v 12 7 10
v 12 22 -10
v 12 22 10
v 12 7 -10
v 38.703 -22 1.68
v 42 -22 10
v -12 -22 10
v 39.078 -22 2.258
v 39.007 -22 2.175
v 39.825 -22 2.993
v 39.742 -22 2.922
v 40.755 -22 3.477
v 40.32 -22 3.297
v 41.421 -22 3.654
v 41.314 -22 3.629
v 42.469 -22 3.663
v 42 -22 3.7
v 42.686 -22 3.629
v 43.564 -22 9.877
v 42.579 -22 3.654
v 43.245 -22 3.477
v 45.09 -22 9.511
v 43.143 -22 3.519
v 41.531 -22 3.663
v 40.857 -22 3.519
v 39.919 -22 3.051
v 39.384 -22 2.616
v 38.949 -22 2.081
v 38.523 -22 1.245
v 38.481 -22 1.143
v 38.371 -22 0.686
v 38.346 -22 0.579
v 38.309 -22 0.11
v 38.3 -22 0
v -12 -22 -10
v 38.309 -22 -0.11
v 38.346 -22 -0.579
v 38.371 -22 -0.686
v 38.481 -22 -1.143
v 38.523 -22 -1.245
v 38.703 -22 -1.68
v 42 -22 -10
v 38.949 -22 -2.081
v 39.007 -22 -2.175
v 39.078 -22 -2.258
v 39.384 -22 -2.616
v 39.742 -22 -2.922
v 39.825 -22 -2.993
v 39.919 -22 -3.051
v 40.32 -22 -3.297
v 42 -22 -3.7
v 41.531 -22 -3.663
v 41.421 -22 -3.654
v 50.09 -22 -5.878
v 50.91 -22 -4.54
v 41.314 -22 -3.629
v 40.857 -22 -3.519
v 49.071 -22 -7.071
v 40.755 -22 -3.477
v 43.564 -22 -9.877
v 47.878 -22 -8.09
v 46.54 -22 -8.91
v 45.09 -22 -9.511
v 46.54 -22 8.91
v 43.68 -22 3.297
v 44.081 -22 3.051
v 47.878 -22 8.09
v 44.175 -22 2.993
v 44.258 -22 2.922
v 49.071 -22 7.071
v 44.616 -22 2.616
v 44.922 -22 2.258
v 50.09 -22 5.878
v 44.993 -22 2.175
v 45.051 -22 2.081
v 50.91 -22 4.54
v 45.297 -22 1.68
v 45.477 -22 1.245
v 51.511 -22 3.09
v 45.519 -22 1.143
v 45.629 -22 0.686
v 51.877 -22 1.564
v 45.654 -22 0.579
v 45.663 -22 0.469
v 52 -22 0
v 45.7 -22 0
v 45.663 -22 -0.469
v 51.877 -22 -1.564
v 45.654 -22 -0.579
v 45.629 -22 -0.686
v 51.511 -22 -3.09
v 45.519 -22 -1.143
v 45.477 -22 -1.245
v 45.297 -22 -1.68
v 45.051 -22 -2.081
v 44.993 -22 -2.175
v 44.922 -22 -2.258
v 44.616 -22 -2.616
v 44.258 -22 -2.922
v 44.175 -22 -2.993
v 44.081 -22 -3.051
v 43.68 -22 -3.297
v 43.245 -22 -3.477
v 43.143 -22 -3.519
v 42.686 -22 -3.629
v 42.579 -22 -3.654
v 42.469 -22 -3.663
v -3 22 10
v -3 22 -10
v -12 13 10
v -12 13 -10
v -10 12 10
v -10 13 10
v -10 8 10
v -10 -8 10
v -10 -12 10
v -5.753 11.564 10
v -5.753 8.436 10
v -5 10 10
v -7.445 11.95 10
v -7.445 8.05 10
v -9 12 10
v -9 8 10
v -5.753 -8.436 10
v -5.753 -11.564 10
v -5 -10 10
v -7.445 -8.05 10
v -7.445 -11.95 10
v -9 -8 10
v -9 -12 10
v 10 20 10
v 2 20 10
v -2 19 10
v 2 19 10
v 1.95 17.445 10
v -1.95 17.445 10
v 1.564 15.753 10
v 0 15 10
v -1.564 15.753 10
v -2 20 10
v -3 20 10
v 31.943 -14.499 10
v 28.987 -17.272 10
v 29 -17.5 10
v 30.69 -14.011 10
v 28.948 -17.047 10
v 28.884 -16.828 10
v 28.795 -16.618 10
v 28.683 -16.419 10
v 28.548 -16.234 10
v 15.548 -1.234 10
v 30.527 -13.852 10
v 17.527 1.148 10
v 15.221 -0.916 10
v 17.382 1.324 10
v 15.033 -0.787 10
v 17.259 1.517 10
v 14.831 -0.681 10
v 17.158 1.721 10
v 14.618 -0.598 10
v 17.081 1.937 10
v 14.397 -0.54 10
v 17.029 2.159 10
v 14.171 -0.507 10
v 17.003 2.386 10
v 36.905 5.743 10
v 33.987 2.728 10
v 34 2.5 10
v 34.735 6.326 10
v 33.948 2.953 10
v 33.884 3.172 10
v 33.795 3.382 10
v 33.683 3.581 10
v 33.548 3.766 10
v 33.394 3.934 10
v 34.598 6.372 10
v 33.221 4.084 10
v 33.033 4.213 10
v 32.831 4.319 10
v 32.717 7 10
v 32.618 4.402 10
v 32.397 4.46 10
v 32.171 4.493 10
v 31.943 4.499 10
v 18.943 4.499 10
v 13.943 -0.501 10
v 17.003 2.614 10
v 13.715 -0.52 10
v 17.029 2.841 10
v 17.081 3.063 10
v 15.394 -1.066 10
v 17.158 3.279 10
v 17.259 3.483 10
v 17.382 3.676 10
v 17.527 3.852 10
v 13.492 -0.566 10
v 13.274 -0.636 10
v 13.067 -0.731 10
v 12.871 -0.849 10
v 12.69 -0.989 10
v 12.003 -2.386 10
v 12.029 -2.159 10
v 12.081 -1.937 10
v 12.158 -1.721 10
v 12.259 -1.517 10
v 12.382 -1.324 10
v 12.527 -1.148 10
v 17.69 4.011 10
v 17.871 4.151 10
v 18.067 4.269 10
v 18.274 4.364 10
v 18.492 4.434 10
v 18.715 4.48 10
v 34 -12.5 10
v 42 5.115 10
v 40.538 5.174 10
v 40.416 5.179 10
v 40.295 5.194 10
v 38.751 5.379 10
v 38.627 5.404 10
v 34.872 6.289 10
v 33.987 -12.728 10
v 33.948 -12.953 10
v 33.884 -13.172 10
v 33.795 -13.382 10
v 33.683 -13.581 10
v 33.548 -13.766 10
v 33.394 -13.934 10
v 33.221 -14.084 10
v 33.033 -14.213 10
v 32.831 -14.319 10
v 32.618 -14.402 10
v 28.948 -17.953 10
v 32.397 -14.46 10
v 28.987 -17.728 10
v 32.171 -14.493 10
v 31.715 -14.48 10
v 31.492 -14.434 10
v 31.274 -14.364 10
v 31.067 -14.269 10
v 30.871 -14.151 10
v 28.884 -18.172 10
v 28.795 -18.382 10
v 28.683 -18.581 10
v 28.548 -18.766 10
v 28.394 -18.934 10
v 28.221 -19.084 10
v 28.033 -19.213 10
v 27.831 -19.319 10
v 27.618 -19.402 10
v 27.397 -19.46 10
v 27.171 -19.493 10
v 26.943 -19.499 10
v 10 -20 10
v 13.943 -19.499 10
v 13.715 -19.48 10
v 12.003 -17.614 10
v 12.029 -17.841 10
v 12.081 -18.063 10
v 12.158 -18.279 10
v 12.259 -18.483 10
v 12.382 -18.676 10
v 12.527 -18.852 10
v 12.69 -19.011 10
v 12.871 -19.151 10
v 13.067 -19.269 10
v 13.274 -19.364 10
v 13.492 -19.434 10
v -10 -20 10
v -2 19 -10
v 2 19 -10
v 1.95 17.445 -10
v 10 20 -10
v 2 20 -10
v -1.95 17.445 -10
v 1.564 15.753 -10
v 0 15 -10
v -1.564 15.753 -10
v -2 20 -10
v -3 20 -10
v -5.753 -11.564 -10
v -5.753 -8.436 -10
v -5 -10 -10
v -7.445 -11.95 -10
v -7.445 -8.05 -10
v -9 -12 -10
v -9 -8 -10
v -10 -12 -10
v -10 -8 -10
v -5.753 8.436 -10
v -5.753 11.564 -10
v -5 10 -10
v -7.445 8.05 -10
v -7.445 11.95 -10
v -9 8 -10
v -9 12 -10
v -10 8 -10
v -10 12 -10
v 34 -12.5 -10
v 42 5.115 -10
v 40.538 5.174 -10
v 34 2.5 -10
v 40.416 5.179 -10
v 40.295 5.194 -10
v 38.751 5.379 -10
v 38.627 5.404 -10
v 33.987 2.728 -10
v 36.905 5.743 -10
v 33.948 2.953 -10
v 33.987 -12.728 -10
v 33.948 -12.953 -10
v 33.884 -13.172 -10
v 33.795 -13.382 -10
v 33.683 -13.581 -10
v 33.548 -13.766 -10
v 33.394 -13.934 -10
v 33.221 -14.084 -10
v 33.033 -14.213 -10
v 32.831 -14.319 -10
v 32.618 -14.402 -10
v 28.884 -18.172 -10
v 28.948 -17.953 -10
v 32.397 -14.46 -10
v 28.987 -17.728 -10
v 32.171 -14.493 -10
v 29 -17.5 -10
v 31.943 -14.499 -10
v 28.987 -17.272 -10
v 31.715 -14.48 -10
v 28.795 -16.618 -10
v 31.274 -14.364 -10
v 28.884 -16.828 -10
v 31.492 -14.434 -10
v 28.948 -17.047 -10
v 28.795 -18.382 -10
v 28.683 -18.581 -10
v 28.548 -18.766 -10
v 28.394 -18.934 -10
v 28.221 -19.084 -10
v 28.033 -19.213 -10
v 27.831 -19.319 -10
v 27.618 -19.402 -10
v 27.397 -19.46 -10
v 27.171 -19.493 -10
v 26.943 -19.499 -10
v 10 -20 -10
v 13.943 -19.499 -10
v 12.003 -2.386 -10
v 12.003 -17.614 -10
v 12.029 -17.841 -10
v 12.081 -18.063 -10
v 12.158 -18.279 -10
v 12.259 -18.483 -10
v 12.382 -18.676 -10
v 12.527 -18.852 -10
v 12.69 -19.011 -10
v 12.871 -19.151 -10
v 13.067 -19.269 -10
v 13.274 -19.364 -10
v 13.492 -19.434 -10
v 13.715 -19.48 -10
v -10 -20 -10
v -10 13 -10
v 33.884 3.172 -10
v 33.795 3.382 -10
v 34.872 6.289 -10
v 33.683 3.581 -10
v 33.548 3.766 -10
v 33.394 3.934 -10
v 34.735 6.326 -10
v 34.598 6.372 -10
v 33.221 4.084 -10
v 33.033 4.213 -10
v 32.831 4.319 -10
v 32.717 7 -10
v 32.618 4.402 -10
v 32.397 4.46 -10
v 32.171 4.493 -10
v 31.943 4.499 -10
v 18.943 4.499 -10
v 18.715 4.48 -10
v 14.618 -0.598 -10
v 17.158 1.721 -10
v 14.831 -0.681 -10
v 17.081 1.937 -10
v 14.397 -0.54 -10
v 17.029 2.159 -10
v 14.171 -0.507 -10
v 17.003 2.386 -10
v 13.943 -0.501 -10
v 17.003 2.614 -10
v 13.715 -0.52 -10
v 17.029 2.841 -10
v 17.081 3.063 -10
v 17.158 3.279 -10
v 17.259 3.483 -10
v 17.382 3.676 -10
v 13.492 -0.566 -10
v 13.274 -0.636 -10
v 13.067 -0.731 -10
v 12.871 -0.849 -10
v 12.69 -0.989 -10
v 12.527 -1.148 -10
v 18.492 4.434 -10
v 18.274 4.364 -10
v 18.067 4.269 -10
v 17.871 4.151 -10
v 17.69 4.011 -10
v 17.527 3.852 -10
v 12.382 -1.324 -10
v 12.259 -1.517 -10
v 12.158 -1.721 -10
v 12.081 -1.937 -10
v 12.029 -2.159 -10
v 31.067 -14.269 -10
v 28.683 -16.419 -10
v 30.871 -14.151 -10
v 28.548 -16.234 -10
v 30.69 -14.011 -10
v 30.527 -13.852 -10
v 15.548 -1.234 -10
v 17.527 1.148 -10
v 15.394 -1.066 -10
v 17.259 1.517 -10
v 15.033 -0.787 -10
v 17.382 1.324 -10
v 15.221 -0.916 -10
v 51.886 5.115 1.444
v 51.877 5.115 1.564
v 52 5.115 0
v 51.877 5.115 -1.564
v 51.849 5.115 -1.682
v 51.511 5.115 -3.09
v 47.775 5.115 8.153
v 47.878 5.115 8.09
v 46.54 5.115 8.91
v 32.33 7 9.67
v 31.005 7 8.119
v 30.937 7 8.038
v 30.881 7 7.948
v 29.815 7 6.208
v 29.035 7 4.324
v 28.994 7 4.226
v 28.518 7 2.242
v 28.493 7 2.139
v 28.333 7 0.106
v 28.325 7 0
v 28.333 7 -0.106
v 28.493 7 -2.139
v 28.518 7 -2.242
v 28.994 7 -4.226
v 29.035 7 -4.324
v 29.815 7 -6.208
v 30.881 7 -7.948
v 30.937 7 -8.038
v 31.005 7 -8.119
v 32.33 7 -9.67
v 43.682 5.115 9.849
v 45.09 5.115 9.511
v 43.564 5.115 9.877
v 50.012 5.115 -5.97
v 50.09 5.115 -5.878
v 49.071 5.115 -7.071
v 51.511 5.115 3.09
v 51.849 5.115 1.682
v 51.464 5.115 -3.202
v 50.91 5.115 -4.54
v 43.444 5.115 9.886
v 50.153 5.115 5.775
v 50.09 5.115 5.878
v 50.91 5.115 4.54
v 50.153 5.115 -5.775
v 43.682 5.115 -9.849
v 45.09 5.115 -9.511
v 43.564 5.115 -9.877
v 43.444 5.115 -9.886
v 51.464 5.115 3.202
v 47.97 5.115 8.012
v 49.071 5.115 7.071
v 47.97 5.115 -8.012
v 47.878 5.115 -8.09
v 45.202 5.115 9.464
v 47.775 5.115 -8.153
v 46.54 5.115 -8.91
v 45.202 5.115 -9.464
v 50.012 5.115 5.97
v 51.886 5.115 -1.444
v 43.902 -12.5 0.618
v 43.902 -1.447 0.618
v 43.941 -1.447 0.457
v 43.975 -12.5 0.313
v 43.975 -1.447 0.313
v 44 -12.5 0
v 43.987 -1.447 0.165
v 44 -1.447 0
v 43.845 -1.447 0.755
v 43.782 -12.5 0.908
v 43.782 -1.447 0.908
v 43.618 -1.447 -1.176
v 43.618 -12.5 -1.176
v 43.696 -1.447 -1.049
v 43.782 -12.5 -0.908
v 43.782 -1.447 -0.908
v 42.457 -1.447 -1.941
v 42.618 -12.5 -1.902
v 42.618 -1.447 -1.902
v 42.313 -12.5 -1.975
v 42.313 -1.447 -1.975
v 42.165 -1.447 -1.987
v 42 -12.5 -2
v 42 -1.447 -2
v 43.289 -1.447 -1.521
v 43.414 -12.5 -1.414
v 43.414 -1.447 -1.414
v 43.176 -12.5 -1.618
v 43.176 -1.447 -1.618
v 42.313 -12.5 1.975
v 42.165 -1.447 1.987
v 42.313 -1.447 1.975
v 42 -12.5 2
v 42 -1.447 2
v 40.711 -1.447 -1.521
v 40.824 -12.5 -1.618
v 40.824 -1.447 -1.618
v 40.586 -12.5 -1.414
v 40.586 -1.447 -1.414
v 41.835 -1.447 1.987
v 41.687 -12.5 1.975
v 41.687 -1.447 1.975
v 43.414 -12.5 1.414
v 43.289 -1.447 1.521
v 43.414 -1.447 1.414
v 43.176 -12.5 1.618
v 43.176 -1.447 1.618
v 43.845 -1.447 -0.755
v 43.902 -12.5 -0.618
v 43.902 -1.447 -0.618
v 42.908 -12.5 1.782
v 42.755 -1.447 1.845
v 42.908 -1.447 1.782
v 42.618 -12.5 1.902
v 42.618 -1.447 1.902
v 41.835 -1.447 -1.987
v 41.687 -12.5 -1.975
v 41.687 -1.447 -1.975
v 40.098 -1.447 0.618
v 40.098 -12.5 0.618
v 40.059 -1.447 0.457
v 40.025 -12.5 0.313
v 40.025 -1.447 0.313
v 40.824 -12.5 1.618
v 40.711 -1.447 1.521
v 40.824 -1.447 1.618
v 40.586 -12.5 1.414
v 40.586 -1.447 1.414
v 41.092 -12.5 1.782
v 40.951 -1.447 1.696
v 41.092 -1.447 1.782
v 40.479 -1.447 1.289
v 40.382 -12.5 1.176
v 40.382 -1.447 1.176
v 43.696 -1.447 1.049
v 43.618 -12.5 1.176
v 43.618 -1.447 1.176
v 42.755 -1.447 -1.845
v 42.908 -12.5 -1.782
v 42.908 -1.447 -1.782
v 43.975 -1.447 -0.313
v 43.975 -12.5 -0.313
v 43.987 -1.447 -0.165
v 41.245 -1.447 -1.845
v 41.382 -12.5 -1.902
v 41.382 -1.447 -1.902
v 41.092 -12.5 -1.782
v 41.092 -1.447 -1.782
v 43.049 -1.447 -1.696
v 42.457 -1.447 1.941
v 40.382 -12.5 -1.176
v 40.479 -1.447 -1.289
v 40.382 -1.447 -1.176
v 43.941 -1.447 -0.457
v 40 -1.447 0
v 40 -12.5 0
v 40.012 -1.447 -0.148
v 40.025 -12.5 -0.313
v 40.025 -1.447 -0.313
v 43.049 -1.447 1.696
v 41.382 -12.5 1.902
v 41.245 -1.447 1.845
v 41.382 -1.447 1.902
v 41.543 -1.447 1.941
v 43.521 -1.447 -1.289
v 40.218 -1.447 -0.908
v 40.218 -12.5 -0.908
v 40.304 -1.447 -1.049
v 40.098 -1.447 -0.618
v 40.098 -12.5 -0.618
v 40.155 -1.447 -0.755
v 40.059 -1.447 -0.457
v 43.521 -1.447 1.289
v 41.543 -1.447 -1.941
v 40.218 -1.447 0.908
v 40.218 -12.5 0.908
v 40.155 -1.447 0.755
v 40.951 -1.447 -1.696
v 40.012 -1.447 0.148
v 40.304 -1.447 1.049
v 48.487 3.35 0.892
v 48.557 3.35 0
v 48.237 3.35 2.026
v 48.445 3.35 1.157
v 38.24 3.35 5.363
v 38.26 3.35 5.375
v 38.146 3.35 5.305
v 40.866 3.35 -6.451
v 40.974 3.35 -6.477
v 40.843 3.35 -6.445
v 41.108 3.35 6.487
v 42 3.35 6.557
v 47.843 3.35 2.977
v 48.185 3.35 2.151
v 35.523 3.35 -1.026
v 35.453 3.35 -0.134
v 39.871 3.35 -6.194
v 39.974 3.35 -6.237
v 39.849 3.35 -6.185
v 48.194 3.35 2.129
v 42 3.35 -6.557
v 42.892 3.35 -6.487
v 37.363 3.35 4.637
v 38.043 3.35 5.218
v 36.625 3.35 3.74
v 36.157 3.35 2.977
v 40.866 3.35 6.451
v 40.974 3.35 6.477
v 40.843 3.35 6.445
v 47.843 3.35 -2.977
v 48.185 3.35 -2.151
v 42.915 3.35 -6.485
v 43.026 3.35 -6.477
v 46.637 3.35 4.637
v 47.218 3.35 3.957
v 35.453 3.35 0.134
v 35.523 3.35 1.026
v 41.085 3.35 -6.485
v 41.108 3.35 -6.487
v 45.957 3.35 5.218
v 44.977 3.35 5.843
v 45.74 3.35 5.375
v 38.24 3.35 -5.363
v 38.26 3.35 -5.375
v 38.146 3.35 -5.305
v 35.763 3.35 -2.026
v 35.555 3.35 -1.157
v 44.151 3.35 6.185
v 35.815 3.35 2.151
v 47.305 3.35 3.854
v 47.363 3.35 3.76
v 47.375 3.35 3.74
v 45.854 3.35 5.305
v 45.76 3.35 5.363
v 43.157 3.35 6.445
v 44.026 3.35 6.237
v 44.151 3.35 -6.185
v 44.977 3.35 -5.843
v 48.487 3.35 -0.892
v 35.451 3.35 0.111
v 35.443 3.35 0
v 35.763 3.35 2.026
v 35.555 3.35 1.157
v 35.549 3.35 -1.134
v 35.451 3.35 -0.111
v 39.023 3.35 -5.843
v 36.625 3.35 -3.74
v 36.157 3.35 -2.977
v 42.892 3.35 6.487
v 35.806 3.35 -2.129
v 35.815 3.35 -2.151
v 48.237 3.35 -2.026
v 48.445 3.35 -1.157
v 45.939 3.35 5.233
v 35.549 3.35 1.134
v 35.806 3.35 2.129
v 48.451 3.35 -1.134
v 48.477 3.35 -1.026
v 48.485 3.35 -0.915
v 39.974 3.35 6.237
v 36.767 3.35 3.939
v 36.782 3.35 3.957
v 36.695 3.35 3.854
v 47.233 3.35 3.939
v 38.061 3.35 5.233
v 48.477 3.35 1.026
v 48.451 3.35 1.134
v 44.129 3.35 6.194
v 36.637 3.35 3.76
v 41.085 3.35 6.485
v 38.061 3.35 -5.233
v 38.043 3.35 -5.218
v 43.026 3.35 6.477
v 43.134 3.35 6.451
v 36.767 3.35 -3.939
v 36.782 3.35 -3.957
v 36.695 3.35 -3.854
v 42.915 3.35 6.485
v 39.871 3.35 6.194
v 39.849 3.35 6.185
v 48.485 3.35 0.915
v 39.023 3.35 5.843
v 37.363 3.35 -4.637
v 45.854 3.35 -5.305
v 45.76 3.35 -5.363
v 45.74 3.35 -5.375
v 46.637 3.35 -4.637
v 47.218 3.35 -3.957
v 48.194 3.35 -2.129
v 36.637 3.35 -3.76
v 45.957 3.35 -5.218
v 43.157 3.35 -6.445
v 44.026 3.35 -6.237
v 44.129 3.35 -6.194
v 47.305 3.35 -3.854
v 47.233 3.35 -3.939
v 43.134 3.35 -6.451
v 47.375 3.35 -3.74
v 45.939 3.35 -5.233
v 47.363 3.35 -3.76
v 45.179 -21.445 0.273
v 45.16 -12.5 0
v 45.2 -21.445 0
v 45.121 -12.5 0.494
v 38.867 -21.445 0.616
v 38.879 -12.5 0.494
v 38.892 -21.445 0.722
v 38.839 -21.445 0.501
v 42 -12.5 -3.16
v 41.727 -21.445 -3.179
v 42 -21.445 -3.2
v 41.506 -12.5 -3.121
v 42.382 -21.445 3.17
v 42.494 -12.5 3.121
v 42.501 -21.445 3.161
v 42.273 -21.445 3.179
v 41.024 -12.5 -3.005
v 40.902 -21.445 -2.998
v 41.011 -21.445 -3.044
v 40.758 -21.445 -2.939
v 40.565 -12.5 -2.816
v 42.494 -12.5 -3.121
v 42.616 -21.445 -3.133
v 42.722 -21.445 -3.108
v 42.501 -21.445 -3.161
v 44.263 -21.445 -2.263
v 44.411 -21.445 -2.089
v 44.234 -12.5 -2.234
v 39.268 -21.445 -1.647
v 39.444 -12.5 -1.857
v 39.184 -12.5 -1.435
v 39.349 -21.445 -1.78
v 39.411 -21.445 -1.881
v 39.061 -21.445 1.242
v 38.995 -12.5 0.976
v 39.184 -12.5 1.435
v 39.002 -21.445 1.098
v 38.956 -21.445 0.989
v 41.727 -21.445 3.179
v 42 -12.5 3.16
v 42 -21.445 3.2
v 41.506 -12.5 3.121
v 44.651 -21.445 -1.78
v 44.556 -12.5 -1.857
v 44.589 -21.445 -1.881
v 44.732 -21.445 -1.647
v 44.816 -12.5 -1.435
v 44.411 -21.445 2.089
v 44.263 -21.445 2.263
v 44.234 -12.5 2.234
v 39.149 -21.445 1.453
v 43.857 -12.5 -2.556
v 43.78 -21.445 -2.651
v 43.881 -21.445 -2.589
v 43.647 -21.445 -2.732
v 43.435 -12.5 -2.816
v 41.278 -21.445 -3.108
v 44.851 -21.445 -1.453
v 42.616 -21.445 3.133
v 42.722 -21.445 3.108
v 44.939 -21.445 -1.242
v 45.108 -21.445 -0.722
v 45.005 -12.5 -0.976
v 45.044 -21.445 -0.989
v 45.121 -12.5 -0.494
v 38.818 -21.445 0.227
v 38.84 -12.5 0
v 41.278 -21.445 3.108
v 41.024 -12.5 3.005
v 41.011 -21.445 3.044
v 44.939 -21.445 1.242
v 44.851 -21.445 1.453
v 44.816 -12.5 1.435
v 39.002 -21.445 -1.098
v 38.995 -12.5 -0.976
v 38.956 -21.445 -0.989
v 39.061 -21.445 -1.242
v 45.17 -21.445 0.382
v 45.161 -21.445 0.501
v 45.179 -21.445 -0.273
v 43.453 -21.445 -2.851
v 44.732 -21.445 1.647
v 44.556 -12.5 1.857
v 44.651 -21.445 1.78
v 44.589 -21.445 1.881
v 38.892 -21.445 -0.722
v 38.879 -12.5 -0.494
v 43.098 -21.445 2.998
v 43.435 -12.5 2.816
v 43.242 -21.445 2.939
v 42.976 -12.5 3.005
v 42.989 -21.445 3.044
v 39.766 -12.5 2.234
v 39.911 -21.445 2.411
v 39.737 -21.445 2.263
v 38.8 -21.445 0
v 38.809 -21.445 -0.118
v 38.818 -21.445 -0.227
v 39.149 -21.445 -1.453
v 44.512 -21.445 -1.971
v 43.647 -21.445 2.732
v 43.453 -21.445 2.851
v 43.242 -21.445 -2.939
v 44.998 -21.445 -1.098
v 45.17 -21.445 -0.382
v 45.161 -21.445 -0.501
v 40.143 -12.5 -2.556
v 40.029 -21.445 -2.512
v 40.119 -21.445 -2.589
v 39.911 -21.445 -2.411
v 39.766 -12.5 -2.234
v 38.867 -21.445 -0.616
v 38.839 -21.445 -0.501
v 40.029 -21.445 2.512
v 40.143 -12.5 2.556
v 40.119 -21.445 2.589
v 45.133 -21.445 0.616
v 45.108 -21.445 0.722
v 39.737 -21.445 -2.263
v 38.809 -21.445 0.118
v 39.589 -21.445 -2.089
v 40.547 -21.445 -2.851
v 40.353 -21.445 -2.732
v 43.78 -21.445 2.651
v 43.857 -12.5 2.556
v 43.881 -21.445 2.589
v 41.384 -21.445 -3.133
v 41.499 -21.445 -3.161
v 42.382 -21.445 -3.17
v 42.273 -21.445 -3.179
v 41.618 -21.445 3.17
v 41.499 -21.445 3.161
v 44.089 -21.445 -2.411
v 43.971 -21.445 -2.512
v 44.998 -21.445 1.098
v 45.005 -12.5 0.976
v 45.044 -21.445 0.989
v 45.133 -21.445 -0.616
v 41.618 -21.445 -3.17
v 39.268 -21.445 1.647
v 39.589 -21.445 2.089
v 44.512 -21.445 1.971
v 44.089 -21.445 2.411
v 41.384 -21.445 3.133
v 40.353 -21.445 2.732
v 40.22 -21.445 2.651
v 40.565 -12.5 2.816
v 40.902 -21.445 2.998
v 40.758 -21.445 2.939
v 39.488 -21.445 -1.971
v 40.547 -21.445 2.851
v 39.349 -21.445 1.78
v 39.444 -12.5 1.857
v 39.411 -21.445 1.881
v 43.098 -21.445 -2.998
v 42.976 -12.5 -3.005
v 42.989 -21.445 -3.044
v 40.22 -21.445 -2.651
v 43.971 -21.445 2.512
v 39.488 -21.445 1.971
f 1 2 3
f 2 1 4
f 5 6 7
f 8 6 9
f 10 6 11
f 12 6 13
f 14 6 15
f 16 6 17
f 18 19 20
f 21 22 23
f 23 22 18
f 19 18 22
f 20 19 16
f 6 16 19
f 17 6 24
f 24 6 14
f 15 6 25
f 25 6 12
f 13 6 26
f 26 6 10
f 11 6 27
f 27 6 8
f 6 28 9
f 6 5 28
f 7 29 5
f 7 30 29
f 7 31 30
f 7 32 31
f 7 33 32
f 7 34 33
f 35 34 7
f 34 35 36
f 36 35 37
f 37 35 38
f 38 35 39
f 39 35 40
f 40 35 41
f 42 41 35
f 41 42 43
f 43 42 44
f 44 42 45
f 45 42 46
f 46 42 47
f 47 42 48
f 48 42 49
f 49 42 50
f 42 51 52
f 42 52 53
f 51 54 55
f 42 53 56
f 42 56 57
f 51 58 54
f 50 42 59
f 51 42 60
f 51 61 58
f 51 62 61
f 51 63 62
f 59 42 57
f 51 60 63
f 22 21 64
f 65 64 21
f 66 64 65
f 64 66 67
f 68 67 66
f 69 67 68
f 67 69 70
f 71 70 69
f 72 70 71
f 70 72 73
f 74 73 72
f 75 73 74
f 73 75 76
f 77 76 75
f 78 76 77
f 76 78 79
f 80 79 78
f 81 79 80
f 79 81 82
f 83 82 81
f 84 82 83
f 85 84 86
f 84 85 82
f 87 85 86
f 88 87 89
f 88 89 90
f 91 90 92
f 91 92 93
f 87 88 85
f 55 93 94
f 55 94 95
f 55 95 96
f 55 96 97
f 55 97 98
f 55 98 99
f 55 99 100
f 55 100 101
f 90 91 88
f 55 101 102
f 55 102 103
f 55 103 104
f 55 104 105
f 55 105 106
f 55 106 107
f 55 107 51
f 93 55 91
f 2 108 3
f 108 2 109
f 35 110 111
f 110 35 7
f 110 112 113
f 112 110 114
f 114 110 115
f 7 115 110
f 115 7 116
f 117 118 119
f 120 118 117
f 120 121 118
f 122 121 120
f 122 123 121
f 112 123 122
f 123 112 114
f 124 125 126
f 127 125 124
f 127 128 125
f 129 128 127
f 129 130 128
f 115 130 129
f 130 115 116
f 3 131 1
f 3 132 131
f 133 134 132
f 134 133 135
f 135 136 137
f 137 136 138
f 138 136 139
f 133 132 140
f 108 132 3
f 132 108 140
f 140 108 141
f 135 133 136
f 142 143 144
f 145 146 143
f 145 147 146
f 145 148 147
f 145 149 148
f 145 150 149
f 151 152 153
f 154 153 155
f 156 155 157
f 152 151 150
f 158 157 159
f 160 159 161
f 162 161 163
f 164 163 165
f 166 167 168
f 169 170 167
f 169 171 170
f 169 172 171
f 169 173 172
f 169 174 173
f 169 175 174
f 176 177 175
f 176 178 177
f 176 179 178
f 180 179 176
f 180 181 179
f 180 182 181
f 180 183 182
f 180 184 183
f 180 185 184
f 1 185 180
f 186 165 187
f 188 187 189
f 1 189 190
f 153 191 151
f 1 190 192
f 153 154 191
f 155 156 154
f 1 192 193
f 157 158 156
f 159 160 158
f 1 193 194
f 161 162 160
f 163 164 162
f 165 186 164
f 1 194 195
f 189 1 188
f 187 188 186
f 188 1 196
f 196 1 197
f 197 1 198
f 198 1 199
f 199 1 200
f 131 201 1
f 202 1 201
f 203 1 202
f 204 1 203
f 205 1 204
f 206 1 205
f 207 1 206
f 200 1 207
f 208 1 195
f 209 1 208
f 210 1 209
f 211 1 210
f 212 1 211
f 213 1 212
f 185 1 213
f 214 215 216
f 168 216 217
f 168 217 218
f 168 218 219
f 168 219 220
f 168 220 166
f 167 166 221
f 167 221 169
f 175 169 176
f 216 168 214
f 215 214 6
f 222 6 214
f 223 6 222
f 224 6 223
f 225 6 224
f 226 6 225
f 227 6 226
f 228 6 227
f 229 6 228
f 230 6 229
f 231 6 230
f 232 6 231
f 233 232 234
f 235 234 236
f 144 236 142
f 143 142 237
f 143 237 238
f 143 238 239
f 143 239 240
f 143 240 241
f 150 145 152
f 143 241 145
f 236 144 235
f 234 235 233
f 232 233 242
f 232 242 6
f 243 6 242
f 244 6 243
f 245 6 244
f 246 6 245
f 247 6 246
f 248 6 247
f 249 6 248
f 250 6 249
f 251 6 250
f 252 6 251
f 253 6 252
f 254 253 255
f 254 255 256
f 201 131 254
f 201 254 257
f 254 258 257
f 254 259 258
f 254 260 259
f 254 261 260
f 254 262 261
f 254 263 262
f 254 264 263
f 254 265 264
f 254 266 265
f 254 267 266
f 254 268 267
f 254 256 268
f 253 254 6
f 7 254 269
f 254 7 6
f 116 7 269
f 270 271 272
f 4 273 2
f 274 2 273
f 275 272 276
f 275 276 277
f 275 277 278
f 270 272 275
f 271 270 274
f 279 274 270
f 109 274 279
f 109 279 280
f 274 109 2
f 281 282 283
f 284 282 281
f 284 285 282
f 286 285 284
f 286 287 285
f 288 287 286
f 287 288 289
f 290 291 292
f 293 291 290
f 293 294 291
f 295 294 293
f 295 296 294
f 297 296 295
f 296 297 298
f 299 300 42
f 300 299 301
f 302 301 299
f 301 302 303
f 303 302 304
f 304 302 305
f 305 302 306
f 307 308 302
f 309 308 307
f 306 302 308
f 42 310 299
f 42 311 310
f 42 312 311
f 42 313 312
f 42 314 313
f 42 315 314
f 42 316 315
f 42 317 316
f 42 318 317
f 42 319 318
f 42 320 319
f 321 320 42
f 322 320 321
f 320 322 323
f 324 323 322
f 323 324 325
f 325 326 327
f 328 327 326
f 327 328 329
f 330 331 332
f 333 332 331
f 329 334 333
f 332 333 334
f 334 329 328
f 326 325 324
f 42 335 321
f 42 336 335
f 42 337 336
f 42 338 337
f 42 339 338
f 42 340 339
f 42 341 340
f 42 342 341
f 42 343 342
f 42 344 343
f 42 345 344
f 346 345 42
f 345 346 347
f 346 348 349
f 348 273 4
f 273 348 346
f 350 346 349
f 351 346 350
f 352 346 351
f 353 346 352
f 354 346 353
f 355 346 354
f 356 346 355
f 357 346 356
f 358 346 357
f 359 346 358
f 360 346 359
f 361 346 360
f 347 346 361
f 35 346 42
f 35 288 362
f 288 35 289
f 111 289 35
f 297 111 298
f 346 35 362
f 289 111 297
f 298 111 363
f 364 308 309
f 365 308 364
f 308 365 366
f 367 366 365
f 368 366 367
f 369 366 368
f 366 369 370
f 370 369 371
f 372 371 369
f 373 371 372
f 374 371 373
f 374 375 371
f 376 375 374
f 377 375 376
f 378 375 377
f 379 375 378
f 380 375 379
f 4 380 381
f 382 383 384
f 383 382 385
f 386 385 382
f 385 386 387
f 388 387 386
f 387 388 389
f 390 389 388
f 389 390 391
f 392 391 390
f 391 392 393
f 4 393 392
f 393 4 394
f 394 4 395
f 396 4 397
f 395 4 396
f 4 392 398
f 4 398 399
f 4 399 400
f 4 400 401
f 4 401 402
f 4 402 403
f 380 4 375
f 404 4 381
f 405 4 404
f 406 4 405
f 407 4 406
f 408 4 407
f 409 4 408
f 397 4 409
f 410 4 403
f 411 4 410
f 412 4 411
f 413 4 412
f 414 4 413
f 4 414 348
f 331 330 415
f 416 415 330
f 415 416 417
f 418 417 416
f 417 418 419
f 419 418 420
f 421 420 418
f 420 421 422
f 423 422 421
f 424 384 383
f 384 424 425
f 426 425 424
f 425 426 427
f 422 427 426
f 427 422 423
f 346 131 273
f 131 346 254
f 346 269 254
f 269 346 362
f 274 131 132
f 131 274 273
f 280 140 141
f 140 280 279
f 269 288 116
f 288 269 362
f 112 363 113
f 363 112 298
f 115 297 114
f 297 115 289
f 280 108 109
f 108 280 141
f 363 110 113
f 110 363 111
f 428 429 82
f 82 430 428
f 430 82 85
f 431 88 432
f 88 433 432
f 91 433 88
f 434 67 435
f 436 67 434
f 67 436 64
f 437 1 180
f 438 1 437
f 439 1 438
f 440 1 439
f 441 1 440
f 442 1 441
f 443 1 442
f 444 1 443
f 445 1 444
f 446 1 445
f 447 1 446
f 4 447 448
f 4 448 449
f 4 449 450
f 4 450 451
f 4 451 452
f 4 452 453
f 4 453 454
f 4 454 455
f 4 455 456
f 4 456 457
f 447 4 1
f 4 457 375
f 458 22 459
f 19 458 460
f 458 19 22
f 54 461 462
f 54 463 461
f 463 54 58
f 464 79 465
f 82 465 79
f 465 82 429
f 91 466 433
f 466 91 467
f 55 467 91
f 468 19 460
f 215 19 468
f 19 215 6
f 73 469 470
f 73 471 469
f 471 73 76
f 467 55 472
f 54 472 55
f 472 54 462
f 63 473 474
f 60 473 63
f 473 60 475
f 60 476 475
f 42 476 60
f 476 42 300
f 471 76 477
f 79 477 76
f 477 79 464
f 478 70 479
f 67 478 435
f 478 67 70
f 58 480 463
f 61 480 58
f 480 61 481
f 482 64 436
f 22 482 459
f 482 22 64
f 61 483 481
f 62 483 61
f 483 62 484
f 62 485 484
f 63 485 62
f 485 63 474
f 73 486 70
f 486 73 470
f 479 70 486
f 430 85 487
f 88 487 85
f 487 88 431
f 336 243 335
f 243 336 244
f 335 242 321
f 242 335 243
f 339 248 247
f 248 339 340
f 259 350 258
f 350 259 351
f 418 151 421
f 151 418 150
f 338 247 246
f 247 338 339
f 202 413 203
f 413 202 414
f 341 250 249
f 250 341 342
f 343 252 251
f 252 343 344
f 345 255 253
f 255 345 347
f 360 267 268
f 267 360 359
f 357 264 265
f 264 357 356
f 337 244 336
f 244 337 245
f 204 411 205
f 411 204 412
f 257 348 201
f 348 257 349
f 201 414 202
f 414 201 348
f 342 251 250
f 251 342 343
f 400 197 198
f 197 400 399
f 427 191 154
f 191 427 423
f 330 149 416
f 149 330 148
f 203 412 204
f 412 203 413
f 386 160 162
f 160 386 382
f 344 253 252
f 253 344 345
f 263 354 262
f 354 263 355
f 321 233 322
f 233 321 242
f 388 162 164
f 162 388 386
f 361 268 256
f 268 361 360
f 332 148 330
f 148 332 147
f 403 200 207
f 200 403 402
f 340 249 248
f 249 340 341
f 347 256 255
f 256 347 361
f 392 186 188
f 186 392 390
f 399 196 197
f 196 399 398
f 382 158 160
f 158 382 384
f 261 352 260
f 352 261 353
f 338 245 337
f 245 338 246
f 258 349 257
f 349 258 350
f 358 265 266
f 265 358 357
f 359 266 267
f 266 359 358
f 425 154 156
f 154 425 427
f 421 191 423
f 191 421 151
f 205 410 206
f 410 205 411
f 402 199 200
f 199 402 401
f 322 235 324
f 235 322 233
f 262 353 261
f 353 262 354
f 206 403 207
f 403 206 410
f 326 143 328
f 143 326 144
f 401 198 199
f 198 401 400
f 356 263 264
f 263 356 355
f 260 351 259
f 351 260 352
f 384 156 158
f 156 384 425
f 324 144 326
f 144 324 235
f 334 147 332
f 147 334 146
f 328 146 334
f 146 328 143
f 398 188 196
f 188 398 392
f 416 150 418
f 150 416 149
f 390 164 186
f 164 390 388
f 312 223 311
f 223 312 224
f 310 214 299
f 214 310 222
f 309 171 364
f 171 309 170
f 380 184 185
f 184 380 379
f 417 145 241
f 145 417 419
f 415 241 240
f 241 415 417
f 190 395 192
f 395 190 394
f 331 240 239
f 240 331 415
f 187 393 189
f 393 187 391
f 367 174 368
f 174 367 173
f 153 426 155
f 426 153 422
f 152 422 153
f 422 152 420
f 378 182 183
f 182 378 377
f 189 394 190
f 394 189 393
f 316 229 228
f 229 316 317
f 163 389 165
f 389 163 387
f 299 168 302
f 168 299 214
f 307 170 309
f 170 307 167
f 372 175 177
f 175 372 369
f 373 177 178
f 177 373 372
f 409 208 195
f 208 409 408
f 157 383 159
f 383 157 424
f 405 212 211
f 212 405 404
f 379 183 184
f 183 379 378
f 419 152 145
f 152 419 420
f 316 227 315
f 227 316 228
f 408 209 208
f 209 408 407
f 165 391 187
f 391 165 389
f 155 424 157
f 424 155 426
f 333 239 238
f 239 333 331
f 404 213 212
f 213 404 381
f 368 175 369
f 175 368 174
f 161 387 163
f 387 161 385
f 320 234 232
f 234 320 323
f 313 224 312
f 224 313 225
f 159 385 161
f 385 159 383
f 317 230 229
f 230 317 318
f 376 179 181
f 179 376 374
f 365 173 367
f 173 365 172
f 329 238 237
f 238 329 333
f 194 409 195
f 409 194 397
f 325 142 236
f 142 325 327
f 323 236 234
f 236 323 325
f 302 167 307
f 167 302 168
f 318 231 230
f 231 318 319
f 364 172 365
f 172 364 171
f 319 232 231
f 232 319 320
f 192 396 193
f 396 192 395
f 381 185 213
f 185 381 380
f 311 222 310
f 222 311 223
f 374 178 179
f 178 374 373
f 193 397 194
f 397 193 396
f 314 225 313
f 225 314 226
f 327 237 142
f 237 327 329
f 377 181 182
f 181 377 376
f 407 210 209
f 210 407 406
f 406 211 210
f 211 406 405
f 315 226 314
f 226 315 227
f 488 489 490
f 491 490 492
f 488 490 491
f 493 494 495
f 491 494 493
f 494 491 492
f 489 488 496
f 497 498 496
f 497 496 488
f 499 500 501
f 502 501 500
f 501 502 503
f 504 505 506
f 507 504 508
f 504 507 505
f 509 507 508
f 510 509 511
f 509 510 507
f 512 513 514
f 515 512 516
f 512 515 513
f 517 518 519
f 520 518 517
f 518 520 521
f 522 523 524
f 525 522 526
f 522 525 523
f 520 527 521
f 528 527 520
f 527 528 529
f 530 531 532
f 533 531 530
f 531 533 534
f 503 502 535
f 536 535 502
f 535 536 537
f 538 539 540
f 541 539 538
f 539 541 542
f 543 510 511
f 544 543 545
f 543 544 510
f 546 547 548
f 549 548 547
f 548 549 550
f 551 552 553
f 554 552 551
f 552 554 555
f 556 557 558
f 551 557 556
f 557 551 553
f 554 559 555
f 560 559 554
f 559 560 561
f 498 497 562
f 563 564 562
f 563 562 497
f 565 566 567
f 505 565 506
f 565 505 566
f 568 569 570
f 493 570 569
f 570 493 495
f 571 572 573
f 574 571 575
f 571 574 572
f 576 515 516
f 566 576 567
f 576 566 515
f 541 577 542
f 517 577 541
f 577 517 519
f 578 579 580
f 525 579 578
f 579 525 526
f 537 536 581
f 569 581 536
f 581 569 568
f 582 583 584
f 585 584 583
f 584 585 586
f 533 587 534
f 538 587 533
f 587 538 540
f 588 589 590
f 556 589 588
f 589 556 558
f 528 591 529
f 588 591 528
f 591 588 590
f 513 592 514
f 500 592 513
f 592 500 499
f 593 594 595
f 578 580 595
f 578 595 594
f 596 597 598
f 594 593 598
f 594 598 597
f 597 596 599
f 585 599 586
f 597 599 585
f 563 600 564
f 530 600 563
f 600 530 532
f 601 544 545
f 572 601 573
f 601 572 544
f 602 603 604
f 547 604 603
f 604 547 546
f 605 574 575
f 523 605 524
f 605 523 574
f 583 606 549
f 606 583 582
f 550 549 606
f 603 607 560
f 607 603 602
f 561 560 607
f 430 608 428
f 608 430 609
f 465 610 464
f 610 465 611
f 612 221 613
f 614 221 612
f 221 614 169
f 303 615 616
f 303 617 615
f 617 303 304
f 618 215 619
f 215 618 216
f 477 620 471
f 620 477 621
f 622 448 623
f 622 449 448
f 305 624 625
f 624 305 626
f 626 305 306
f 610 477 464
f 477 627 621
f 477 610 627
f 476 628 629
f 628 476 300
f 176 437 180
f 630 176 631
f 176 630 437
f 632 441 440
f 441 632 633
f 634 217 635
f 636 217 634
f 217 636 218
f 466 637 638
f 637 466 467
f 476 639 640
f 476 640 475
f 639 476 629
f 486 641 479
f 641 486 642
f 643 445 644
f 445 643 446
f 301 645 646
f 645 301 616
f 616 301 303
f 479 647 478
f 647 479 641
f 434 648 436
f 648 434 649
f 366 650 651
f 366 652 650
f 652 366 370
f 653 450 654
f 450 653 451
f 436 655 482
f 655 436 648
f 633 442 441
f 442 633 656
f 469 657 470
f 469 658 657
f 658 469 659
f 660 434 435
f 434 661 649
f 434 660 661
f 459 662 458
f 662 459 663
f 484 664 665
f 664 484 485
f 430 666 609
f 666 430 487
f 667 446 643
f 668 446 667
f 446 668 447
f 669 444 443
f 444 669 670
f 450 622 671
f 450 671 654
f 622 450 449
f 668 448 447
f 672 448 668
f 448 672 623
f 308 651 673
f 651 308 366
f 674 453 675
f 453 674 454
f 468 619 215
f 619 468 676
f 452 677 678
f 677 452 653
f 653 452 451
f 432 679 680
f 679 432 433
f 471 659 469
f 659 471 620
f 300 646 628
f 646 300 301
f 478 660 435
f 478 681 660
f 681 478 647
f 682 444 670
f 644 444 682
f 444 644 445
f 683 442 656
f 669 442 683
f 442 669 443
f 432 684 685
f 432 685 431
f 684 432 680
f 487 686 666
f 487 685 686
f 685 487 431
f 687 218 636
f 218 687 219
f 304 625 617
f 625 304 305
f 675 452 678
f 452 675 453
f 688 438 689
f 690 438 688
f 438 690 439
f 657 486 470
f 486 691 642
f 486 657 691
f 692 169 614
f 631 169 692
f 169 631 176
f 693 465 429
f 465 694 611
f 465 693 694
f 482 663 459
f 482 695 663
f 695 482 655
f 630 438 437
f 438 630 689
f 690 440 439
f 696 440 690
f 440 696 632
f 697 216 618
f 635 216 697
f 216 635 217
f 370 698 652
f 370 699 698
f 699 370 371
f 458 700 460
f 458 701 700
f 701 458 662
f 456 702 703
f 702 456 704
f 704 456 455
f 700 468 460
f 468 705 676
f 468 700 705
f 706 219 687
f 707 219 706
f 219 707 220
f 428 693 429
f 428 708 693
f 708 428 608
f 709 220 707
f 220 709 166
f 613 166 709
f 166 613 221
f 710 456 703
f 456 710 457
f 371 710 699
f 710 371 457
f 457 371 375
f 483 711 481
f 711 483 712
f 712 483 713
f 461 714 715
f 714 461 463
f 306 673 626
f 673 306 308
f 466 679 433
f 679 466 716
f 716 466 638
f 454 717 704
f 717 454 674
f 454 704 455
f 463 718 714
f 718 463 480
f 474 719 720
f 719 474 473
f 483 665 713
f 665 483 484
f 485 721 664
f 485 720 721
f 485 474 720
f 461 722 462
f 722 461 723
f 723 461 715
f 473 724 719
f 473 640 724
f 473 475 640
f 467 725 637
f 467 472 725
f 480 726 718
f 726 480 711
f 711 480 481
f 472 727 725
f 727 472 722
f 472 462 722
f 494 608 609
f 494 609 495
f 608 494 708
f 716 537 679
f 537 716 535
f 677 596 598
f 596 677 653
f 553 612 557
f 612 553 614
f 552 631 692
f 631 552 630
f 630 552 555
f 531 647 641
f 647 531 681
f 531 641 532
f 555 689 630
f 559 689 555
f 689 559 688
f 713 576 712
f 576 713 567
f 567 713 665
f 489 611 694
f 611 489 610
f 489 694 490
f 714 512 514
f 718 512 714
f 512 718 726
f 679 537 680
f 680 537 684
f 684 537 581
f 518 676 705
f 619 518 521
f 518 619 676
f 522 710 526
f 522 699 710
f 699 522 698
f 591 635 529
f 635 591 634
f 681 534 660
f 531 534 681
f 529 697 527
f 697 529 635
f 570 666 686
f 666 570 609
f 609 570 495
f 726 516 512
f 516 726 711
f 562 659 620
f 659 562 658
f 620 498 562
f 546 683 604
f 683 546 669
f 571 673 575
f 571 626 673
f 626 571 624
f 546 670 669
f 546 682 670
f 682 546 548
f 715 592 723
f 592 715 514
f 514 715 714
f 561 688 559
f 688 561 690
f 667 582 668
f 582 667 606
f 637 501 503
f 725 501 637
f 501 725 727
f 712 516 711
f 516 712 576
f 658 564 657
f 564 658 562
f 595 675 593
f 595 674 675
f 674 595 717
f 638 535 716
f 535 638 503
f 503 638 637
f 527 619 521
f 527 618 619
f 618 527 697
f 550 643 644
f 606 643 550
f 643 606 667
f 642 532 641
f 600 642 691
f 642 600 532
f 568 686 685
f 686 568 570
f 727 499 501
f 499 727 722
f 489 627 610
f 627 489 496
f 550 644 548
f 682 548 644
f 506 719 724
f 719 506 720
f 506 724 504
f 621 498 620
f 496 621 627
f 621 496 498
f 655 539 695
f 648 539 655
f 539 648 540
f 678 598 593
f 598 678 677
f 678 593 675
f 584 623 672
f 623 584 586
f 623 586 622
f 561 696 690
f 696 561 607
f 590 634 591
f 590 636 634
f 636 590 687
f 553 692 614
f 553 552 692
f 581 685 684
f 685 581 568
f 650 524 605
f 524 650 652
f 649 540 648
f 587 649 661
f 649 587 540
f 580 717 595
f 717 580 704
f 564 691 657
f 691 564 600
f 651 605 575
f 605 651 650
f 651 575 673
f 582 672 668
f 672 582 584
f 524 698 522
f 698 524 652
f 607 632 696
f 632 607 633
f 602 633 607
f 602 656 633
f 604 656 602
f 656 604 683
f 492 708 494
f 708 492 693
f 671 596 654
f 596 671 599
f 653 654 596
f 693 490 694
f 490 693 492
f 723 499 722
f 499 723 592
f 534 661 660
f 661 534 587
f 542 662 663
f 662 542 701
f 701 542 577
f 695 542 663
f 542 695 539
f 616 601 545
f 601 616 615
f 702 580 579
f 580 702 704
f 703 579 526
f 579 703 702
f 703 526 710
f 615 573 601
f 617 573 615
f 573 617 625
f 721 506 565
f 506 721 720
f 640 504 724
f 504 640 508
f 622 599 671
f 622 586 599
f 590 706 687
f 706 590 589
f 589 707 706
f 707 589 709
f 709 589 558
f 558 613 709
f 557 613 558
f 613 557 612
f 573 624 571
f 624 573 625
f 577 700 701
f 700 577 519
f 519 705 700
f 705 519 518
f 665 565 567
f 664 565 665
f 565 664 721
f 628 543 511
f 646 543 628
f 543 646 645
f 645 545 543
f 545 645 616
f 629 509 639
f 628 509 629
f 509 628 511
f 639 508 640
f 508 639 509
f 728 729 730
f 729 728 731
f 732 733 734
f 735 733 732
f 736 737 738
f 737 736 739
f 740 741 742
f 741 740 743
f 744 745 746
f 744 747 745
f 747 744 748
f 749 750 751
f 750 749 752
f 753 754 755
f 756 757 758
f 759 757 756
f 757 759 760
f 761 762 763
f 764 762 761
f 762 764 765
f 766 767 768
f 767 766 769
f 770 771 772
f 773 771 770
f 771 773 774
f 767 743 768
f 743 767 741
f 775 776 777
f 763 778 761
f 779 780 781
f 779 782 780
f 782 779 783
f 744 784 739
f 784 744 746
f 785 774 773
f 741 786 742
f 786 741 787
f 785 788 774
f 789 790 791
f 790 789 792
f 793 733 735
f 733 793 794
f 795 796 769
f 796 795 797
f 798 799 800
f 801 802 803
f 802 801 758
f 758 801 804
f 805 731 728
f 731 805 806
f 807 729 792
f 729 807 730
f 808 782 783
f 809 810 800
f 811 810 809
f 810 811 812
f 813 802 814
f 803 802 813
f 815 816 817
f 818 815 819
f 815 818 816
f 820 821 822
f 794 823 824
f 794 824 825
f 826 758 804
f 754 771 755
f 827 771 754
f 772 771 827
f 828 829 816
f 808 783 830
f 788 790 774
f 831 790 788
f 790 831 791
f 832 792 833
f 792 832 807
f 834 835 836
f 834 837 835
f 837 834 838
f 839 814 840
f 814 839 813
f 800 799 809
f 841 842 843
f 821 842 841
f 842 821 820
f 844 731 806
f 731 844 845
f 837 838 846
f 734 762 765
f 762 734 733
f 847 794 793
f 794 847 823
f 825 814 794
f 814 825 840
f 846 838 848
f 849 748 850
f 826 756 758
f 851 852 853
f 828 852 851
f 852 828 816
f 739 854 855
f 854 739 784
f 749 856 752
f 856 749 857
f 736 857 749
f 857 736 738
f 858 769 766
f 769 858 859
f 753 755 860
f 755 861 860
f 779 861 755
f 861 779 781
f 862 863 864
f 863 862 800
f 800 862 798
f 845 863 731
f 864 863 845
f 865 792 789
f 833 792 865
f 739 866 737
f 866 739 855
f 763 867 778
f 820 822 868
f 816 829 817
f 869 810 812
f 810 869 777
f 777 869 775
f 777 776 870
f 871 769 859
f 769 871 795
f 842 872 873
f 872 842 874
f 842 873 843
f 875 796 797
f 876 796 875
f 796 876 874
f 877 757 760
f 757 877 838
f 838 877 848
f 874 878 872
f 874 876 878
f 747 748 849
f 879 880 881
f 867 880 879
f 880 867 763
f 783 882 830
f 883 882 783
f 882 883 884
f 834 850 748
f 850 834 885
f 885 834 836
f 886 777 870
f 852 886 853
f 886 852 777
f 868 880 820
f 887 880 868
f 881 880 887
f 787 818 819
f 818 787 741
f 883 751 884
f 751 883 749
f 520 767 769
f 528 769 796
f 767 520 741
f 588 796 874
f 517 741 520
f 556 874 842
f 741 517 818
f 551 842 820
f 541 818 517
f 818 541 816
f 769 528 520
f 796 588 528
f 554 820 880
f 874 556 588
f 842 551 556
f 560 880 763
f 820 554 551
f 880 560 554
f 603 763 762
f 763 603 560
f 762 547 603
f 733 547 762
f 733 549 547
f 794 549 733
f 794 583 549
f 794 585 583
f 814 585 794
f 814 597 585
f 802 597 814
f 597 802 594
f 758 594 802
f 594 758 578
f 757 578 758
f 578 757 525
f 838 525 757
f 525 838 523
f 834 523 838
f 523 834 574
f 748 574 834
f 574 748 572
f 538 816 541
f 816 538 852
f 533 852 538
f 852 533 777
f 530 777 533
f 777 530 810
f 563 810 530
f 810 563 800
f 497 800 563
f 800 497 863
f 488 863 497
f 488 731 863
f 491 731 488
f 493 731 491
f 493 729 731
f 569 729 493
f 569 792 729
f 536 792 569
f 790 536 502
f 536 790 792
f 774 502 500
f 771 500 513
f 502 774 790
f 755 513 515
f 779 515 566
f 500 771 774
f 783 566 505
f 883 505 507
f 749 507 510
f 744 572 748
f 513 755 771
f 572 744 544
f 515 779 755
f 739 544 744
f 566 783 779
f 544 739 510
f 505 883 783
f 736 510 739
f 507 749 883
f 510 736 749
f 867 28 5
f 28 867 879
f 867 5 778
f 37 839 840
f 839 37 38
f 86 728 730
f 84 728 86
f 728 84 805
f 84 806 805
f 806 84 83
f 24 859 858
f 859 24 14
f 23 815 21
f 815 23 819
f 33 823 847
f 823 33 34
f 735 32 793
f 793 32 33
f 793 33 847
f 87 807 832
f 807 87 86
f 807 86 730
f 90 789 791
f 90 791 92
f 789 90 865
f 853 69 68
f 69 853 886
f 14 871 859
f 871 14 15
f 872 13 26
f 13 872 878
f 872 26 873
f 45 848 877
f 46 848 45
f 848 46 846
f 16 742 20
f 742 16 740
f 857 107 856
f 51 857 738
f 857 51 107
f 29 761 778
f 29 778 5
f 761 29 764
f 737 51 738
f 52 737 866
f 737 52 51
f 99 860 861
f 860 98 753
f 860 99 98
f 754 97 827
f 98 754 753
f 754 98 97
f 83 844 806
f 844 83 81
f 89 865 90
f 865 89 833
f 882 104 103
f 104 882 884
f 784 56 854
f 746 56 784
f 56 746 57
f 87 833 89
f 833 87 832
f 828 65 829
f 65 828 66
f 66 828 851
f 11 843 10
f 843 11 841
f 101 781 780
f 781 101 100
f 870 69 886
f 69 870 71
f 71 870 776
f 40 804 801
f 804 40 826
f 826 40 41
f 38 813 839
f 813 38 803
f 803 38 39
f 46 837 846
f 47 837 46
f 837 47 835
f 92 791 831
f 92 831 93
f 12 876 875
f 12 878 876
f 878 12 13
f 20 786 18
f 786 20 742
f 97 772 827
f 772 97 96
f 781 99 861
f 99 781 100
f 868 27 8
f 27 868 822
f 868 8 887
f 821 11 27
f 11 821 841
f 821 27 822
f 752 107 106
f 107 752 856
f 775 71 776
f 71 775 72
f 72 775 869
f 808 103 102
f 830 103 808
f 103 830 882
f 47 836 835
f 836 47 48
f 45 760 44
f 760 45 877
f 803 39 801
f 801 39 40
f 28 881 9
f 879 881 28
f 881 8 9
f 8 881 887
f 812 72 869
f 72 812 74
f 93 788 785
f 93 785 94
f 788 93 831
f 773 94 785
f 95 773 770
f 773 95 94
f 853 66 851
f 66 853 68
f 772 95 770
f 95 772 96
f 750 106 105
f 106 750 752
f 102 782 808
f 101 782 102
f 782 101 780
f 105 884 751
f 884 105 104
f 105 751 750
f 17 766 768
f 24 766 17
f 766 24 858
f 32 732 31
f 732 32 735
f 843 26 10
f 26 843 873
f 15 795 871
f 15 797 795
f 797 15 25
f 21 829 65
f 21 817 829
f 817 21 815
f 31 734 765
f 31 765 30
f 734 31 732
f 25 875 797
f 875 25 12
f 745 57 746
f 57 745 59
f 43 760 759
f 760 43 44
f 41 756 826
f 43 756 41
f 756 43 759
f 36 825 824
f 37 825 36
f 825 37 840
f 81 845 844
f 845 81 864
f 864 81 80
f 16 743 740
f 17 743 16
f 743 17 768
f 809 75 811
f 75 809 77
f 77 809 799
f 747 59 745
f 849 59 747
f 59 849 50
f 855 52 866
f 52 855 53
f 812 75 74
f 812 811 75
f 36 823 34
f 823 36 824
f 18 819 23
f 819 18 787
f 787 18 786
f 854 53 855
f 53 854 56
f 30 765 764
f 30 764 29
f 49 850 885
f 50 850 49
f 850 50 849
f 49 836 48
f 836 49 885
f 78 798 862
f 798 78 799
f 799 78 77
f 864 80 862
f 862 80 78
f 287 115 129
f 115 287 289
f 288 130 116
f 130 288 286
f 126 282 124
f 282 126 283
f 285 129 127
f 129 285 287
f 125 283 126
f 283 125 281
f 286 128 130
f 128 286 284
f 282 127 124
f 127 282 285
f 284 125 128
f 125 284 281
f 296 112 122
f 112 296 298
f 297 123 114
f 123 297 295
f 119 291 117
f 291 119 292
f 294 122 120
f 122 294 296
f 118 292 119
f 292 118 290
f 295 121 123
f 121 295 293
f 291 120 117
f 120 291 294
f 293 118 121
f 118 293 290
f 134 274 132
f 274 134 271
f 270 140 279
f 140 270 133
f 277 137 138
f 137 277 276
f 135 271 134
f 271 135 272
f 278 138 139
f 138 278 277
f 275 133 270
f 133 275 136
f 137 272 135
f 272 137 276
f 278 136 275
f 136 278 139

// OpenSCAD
$distance = 30;
width = 20;
height = 40;
inset = 6;

// 20, 40, 6

rotate([90,0,0]) {
// main clamp
difference() {
    cube(size = [width+4,20,height+4], center = true);
    cube(size = [width,30,height], center = true);
    translate([-(width/2)-(inset/2),0,-(height*3/4)-(inset/2)]) {
        cube(size = [width,30,height], center = true);
    }
    
    // chamfered edges
	/*
    translate([29.5,0,-25.5]) rotate([0,45,0]) cube(size = [5,25,5], center = true);
    translate([-30,0,25.5]) rotate([0,45,0]) cube(size = [5,25,5], center = true);
    translate([-30,0,11]) rotate([0,45,0]) cube(size = [5,25,5], center = true);
	*/

}

// chamfered inner edge
//translate([27,0,-22.5]) rotate([0,45,0]) cube(size = [2,20,2], center = true);

// hook left top
translate([-width/2, 0, height/4]) {
	hull() {
		cube(size = [2,20,4], center = true);
		translate([3,0,0]) rotate([90,0,0]) cylinder(h=20,d=4,center=true);
	}
}
// hook left bottom
translate([-width/2, 0, -height/4]) {
	hull() {
		cube(size = [2,20,4], center = true);
		translate([3,0,0]) rotate([90,0,0]) cylinder(h=20,d=4,center=true);
	}
}
// hook bottom middle
translate([0, 0, -height/2]) {
	rotate([0,-90,0]) hull() {
		cube(size = [2,20,4], center = true);
		translate([3,0,0]) rotate([90,0,0]) cylinder(h=20,d=4,center=true);
	}
}

// spool guide
translate([width/2+2,0,((height-29)/2)+2]) {
    difference() {
        hull() {
            cube(size = [1,20,29], center = true);
            translate([$distance,0,0]) {
                cylinder(h=29, r1=10, r2=10, center=true, $fn=40);
            }
        }
        
        hull() {
            translate([$distance-15,0,10]) {
                rotate([90,0,0]) {
                    cylinder(h=29, r1=2, r2=2, center=true, $fn=55);
                }
            }
            translate([2,0,10]) {
                rotate([90,0,0]) {
                    cylinder(h=29, r1=2, r2=2, center=true, $fn=55);
                }
            }
            translate([2,0,-5]) {
                rotate([90,0,0]) {
                    cylinder(h=29, r1=2, r2=2, center=true, $fn=55);
                }
            }
        }
        hull() {
            translate([$distance-10,0,5]) {
                rotate([90,0,0]) {
                    cylinder(h=29, r1=2, r2=2, center=true, $fn=55);
                }
            }
            translate([$distance-10,0,-10]) {
                rotate([90,0,0]) {
                    cylinder(h=29, r1=2, r2=2, center=true, $fn=55);
                }
            }
            translate([7,0,-10]) {
                rotate([90,0,0]) {
                    cylinder(h=29, r1=2, r2=2, center=true, $fn=55);
                }
            }
        }
        
        translate([$distance,0,0]) {
            cylinder(h=90, r1=2, r2=2, center=true, $fn=40);
        }
        translate([$distance,0,-18]) {
            cylinder(h=20, r1=40, r2=1, center=true, $fn=40);
        }
        translate([$distance,0,-15]) {
            cylinder(h=20, r1=20, r2=1, center=true, $fn=40);
        }
        translate([$distance,0,15]) {
            cylinder(h=20, r1=3.16, r2=3.25, center=true, $fn=40);
        }
        translate([$distance,0,16.5]) {
            cylinder(h=10, r1=1, r2=10, center=true, $fn=40);
        }
    }
}
}
